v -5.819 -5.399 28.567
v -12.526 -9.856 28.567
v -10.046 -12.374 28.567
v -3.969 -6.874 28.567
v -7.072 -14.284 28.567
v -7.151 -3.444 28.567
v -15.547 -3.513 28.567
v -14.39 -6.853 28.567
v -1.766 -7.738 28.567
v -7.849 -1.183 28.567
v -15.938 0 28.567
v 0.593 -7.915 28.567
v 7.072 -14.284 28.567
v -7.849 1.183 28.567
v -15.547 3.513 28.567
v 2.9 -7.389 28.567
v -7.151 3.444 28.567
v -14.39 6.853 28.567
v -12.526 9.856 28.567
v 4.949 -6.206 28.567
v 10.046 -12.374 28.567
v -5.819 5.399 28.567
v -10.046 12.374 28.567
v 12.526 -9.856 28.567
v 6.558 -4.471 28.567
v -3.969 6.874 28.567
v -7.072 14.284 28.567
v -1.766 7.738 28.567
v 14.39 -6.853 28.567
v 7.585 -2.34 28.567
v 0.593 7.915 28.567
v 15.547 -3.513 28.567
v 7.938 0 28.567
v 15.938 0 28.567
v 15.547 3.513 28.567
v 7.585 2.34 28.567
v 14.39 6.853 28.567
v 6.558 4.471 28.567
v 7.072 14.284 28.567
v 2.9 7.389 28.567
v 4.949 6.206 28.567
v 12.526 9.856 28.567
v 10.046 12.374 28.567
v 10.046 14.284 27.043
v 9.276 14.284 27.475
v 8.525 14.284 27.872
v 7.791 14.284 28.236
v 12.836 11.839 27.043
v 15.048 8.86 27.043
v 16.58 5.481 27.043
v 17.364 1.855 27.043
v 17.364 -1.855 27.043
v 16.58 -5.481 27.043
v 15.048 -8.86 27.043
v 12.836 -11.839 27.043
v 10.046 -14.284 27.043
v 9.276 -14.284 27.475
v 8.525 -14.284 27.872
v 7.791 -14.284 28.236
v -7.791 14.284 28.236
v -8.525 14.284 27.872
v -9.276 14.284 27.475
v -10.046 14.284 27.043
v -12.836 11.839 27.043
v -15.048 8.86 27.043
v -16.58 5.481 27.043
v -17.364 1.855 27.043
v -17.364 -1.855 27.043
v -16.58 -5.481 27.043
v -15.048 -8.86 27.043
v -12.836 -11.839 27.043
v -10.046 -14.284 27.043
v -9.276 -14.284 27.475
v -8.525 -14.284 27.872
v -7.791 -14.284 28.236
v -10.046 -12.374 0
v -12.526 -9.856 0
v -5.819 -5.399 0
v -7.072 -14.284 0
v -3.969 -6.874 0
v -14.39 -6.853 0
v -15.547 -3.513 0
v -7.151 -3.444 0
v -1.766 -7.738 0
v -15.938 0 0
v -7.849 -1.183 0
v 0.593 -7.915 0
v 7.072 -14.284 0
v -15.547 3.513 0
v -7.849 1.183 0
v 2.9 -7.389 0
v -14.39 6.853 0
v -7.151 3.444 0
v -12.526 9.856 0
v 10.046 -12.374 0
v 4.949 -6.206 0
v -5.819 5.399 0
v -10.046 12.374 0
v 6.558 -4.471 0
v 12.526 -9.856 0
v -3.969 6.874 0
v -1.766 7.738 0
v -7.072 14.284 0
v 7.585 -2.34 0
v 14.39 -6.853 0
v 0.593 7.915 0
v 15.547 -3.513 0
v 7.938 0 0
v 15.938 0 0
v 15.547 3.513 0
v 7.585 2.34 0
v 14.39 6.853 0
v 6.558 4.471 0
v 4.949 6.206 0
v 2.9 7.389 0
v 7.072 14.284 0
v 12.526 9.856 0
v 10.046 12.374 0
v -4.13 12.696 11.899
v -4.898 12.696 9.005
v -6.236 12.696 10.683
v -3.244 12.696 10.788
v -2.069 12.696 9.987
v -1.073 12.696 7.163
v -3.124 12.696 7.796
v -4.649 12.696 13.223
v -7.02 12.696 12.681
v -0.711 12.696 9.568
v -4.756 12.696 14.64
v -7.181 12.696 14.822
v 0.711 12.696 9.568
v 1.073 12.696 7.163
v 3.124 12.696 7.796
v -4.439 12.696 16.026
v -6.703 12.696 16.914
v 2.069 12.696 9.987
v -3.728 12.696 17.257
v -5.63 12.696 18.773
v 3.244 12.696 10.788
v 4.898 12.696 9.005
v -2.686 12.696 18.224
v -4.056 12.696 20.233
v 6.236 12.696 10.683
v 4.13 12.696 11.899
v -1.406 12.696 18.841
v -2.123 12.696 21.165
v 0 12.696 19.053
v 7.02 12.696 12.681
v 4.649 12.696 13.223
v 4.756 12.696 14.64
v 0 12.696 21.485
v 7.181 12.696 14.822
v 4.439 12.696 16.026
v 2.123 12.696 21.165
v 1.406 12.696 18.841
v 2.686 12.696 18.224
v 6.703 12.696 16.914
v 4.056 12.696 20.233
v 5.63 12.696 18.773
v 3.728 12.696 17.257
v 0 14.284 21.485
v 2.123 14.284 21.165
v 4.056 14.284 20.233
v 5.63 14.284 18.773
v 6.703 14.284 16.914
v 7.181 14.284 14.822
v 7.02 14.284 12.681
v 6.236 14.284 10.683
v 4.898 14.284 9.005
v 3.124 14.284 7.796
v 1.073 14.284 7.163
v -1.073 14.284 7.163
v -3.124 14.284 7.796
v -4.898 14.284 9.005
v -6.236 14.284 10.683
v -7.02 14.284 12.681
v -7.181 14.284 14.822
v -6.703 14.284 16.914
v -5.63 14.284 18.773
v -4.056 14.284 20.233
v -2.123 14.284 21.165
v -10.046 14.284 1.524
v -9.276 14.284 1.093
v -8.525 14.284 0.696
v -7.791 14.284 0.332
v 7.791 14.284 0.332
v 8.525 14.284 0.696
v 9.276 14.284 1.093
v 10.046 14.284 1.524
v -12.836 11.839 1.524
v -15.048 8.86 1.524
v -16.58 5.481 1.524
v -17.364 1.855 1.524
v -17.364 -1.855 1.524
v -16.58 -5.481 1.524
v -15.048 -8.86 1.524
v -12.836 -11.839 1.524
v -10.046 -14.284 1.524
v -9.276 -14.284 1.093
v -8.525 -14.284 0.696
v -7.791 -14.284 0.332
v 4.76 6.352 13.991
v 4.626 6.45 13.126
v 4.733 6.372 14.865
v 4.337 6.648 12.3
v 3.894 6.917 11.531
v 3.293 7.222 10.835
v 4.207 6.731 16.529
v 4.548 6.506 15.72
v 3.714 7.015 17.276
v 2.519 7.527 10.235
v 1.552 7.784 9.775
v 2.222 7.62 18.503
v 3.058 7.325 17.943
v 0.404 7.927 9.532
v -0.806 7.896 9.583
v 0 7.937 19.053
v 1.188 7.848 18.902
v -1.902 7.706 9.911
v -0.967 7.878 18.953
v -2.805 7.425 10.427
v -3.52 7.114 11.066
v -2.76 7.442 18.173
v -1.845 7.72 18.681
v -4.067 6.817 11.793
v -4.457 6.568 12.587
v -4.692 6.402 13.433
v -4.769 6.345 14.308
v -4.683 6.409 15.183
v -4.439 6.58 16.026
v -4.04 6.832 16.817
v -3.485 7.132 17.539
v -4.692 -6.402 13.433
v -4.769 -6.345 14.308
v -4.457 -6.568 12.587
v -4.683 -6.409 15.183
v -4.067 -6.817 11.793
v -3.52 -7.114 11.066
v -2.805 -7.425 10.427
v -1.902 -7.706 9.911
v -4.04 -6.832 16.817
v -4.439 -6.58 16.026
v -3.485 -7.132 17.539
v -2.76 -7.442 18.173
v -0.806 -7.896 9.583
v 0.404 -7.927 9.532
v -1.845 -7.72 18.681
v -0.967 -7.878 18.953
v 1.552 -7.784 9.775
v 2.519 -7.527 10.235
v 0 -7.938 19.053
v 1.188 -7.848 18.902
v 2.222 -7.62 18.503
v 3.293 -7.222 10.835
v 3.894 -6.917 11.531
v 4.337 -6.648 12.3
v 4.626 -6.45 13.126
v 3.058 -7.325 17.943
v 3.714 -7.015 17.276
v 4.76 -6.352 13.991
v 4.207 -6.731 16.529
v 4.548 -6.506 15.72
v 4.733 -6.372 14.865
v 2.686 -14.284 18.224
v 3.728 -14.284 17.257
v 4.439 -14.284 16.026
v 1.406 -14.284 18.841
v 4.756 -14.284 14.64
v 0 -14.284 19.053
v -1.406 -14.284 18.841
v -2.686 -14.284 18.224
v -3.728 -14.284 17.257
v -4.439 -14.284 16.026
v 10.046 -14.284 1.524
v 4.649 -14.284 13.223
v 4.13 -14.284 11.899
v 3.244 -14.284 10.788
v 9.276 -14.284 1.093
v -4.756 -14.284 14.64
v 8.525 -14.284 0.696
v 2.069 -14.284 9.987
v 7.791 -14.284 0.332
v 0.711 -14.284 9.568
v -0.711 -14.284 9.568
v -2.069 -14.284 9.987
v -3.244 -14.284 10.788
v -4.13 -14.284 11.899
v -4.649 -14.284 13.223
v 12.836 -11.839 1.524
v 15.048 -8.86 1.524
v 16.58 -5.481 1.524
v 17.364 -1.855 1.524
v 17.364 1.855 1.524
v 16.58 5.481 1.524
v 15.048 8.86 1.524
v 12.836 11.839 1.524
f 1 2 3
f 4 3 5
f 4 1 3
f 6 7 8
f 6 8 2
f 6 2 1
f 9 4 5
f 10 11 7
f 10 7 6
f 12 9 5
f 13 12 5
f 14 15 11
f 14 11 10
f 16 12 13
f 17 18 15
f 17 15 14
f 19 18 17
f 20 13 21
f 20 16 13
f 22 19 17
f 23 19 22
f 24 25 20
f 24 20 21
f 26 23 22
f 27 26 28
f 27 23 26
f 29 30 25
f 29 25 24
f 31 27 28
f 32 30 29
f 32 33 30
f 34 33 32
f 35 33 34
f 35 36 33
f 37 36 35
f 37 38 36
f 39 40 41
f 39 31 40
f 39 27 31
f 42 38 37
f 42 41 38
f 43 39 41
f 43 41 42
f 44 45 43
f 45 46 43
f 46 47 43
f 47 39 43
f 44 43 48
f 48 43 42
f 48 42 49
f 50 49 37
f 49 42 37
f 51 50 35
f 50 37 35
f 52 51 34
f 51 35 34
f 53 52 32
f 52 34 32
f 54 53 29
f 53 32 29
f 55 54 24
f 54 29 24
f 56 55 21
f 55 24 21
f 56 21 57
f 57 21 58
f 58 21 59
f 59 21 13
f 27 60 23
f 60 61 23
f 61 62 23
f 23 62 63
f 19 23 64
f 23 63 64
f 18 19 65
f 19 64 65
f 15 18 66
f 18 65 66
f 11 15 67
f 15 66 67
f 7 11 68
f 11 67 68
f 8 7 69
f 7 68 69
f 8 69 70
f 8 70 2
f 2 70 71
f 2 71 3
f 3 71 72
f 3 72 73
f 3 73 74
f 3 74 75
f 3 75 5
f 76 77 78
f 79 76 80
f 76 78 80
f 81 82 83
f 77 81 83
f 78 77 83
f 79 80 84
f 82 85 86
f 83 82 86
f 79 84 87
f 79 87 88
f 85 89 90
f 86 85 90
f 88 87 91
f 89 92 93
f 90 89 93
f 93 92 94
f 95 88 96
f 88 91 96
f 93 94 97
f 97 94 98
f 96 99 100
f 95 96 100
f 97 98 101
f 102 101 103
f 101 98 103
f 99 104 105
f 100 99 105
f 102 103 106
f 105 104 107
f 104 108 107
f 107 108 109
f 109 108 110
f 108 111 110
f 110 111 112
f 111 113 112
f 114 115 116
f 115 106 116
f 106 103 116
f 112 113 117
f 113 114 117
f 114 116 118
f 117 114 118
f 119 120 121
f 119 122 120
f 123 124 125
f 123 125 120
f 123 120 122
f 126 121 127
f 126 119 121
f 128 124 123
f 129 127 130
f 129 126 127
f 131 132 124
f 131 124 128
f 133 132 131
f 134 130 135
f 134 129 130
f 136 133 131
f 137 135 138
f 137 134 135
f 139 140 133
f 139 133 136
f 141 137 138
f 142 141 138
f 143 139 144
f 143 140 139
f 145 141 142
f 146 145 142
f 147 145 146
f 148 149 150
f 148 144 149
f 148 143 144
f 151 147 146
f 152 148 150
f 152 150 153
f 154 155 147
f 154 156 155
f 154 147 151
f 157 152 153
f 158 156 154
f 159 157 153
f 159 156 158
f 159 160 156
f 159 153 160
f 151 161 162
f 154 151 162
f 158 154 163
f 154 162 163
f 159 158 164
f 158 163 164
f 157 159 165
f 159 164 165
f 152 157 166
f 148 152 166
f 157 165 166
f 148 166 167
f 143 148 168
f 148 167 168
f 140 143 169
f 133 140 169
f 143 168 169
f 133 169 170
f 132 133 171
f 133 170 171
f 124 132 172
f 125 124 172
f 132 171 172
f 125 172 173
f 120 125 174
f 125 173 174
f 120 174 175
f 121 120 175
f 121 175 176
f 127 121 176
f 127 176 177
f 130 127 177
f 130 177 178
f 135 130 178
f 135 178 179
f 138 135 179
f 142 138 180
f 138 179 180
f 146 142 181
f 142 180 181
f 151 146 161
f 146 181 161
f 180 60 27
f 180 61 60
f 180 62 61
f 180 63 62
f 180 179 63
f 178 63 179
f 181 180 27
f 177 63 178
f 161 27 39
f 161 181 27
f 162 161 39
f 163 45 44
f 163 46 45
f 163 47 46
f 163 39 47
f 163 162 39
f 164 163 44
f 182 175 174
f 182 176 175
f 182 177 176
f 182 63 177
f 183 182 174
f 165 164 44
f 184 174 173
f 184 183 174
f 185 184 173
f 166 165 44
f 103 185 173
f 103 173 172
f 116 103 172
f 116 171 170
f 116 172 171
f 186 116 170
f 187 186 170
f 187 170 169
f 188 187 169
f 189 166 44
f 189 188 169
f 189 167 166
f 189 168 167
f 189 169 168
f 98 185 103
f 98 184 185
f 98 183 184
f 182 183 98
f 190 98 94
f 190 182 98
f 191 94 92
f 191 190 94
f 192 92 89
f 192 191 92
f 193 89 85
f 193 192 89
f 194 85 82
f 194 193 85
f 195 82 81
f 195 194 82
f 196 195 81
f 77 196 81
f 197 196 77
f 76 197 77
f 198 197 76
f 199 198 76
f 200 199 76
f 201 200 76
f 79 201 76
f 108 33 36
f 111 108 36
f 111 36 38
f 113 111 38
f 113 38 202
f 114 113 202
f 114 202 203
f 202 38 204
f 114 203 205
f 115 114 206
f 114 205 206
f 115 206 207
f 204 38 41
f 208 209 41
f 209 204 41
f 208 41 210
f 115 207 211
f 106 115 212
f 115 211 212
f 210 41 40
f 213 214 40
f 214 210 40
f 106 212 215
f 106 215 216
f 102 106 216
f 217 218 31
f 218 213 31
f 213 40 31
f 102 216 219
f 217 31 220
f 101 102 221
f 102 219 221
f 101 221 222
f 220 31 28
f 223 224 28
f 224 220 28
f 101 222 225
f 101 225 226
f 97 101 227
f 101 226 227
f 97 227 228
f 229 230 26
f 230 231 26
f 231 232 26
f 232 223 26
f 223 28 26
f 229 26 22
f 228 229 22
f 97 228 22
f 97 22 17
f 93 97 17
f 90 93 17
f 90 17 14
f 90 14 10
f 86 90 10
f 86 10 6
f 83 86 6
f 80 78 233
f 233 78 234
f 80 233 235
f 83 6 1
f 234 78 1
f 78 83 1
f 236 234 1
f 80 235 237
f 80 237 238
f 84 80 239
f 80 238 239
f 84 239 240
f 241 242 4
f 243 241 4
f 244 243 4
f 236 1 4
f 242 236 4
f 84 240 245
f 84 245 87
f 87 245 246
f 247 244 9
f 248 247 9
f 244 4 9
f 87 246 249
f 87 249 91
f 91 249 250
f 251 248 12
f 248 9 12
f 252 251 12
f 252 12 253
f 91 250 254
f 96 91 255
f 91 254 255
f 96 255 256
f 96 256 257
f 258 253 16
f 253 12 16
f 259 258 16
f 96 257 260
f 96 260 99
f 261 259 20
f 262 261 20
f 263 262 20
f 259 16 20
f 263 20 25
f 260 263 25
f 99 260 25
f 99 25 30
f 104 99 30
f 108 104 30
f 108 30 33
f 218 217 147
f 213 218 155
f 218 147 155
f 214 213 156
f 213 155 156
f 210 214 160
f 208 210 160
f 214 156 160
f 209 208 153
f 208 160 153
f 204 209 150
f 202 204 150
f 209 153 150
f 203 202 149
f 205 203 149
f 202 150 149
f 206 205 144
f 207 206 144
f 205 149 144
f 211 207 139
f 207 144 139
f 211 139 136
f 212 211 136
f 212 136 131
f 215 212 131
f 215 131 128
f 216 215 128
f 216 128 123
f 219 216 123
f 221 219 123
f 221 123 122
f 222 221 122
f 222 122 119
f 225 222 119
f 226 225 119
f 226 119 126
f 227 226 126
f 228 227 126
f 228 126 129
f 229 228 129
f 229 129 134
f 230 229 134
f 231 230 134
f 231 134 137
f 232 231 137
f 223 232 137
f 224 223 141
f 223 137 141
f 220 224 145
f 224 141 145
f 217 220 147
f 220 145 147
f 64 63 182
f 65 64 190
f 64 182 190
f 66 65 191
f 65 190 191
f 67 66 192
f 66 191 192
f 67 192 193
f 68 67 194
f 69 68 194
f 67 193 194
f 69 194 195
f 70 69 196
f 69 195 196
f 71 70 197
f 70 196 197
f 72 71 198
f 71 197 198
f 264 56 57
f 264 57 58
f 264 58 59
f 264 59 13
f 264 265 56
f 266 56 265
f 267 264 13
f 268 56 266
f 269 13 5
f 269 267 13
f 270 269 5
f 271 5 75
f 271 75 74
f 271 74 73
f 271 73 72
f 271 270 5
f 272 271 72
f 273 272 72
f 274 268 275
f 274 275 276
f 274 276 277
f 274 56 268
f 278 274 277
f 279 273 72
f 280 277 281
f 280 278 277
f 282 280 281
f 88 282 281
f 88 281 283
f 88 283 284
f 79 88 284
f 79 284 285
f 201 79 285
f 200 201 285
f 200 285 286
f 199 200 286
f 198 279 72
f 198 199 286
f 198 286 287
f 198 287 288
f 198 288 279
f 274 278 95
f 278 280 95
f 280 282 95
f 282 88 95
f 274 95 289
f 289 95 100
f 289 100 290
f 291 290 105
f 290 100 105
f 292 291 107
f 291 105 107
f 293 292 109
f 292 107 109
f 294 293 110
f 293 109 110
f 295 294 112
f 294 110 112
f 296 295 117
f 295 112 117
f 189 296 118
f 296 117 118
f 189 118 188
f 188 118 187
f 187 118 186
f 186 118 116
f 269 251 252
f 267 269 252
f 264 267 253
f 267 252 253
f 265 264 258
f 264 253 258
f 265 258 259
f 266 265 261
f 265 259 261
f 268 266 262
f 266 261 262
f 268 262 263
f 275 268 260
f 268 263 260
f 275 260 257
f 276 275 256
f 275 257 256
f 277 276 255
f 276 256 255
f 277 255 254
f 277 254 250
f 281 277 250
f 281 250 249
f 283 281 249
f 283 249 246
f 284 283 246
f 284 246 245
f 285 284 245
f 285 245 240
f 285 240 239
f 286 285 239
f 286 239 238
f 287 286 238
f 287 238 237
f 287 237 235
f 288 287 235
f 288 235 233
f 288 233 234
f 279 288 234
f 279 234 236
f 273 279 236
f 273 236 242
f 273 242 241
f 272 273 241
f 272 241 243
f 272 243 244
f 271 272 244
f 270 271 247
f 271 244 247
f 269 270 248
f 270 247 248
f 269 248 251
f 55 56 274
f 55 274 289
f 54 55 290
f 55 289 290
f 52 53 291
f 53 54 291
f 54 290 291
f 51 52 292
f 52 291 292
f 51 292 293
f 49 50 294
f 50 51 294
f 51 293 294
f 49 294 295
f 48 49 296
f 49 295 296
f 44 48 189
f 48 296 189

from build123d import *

# Parameters (mm, degrees)
SKETCH7_R           = 17.4625
BOSS_EXTRUDE1_DEPTH = 28.56738
CUT_EXTRUDE1_START  = -28.575
CUT_EXTRUDE1_DEPTH  = 28.575
SKETCH10_R          = 4.76885
CUT_EXTRUDE2_DEPTH  = 45.012831156
SKETCH11_R          = 7.2009
CUT_EXTRUDE3_DEPTH  = 1.5875
SKETCH12_R          = 7.9375
CUT_EXTRUDE4_DEPTH  = 37.401344842
CHAMFER2_SIZE       = 1.524


with BuildPart() as part:
    # Sketch7 → Boss-Extrude1 (new body)
    with BuildSketch(Plane.XY):
        Circle(SKETCH7_R)
    extrude(amount=BOSS_EXTRUDE1_DEPTH)

    # Sketch9 → Cut-Extrude1 (cut)
    with BuildSketch(Plane.XY.offset(28.56738).offset(CUT_EXTRUDE1_START)):
        with BuildLine():
            ThreePointArc((10.045651111, 14.28369), (0, 17.4625), (-10.04565111, 14.28369))
            Line((-10.04565111, 14.28369), (10.045651111, 14.28369))
        make_face()
        with BuildLine():
            Line((10.045651111, -14.28369), (-10.04565111, -14.28369))
            ThreePointArc((-10.04565111, -14.28369), (0, -17.4625), (10.045651111, -14.28369))
        make_face()
    extrude(amount=CUT_EXTRUDE1_DEPTH, mode=Mode.SUBTRACT)

    # Sketch10 → Cut-Extrude2 (cut, through all)
    with BuildSketch(Plane(origin=(0, 14.28369, 0), x_dir=(1, 0, 0), z_dir=(0, 1, 0))):
        with Locations(Location((0, -14.28369, 0), (0, 0, 270))):
            Circle(SKETCH10_R)
    extrude(amount=-CUT_EXTRUDE2_DEPTH, mode=Mode.SUBTRACT)

    # Sketch11 → Cut-Extrude3 (cut)
    with BuildSketch(Plane(origin=(0, 14.28369, 0), x_dir=(1, 0, 0), z_dir=(0, 1, 0))):
        with Locations(Location((0, -14.28369, 0), (0, 0, 270))):
            Circle(SKETCH11_R)
    extrude(amount=-CUT_EXTRUDE3_DEPTH, mode=Mode.SUBTRACT)

    # Sketch12 → Cut-Extrude4 (cut, through all)
    with BuildSketch(Plane.XY.offset(28.56738)):
        Circle(SKETCH12_R)
    extrude(amount=-CUT_EXTRUDE4_DEPTH, mode=Mode.SUBTRACT)

    # Chamfer2
    chamfer2_edges = [part.edges().sort_by_distance(p)[0] for p in [
        (17.4625, 0, 0),
        (17.4625, 0, 28.56738),
        (-17.4625, 0, 0),
        (-17.4625, 0, 28.56738),
    ]]
    chamfer(chamfer2_edges, length=CHAMFER2_SIZE)


solid = part.part
